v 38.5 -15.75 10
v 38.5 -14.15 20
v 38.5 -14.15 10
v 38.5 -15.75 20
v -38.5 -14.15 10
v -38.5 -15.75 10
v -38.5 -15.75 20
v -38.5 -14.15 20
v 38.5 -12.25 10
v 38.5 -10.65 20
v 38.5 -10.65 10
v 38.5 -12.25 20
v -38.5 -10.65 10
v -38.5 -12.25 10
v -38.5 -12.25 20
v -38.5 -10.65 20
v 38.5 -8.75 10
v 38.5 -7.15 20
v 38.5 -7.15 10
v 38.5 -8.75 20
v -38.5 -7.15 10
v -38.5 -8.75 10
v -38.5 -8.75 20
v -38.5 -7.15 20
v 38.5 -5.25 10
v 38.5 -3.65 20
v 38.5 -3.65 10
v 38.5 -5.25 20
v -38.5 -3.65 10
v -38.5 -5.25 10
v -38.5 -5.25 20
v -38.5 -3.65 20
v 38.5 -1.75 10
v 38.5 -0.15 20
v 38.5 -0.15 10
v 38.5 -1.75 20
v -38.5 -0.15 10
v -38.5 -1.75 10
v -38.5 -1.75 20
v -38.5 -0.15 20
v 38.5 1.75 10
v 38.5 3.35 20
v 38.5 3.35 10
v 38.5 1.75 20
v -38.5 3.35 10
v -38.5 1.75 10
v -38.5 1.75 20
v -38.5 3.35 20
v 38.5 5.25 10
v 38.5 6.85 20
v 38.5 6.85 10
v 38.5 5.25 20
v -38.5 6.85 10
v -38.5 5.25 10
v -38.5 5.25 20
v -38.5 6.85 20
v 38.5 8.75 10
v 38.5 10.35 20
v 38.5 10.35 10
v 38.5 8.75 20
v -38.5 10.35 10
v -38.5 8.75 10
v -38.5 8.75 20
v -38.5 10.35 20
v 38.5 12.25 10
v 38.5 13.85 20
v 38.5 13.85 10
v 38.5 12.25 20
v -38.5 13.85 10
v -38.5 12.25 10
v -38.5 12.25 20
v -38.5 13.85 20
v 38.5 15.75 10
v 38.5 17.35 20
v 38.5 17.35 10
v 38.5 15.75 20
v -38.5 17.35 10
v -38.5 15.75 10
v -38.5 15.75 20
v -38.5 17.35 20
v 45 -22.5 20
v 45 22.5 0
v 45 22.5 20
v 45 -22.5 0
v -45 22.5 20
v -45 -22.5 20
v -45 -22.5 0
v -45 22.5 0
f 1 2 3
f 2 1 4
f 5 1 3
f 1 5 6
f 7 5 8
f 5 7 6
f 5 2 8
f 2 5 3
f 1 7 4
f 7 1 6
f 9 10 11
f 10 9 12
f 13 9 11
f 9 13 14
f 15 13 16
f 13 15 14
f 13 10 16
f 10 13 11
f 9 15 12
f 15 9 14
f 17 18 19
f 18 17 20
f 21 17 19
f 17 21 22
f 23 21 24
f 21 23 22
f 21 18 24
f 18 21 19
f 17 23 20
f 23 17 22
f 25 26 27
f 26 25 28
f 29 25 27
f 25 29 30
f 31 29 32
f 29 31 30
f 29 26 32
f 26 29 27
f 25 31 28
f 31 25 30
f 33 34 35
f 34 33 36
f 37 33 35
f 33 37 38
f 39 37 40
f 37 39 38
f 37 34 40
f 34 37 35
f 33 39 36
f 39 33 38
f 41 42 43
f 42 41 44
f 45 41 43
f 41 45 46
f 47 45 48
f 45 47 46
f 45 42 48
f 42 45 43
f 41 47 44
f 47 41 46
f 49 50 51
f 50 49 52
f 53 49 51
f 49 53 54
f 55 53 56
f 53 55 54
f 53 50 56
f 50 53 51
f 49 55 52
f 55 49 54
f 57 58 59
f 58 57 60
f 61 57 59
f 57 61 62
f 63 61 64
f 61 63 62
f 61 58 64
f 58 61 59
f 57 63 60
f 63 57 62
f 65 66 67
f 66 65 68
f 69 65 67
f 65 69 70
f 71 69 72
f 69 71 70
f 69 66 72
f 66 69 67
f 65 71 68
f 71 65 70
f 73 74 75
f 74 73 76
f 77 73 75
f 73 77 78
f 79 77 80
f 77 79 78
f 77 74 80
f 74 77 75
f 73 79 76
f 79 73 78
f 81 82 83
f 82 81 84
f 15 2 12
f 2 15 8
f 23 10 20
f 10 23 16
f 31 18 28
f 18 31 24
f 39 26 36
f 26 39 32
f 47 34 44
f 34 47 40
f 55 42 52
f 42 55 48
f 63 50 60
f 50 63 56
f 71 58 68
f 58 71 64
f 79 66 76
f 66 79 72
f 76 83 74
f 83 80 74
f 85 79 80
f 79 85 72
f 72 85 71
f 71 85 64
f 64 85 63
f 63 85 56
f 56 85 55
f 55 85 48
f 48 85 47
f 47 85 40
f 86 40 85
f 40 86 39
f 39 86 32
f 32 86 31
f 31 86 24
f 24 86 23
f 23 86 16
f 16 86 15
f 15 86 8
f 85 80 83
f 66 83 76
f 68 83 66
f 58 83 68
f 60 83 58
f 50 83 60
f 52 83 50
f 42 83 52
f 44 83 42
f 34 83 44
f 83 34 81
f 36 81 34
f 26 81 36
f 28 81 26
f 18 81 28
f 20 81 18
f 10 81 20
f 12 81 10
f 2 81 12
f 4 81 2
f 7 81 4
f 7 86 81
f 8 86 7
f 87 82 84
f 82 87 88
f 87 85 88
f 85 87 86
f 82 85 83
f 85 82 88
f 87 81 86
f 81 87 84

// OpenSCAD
// Drying rack for 10 microscope slides
// Print orientation: base on XY plane, slots open upward (+Z)

$fn = 64;

// ---- Block dimensions ----
block_x = 90;        // block length (X)
block_y = 45;        // block width (Y)
block_z = 20;        // block height (Z)

// ---- Slot dimensions ----
slot_n     = 10;     // number of slots
slot_len   = 77;     // slot length (X)
slot_w     = 1.6;    // slot width (Y)
slot_depth = 10;     // slot depth from top face (Z)

// ---- Layout ----
slot_pitch = 3.5;    // centre-to-centre spacing in Y
group_y    = 0;      // Y position of the slot group (will be centred)

// ---- Cutting overlap ----
eps = 0.5;           // extension past top face to avoid coplanar faces

// Y position of first slot so the group is centred on the origin
first_y = group_y - (slot_n - 1) * slot_pitch / 2;

difference() {
    // Solid base block, centred in X and Y, resting on z = 0
    translate([-block_x / 2, -block_y / 2, 0])
        cube([block_x, block_y, block_z]);

    // 10 parallel slots along X, open at the top
    for (i = [0 : slot_n - 1])
        translate([-slot_len / 2, first_y + i * slot_pitch, block_z - slot_depth])
            cube([slot_len, slot_w, slot_depth + eps]);
}
